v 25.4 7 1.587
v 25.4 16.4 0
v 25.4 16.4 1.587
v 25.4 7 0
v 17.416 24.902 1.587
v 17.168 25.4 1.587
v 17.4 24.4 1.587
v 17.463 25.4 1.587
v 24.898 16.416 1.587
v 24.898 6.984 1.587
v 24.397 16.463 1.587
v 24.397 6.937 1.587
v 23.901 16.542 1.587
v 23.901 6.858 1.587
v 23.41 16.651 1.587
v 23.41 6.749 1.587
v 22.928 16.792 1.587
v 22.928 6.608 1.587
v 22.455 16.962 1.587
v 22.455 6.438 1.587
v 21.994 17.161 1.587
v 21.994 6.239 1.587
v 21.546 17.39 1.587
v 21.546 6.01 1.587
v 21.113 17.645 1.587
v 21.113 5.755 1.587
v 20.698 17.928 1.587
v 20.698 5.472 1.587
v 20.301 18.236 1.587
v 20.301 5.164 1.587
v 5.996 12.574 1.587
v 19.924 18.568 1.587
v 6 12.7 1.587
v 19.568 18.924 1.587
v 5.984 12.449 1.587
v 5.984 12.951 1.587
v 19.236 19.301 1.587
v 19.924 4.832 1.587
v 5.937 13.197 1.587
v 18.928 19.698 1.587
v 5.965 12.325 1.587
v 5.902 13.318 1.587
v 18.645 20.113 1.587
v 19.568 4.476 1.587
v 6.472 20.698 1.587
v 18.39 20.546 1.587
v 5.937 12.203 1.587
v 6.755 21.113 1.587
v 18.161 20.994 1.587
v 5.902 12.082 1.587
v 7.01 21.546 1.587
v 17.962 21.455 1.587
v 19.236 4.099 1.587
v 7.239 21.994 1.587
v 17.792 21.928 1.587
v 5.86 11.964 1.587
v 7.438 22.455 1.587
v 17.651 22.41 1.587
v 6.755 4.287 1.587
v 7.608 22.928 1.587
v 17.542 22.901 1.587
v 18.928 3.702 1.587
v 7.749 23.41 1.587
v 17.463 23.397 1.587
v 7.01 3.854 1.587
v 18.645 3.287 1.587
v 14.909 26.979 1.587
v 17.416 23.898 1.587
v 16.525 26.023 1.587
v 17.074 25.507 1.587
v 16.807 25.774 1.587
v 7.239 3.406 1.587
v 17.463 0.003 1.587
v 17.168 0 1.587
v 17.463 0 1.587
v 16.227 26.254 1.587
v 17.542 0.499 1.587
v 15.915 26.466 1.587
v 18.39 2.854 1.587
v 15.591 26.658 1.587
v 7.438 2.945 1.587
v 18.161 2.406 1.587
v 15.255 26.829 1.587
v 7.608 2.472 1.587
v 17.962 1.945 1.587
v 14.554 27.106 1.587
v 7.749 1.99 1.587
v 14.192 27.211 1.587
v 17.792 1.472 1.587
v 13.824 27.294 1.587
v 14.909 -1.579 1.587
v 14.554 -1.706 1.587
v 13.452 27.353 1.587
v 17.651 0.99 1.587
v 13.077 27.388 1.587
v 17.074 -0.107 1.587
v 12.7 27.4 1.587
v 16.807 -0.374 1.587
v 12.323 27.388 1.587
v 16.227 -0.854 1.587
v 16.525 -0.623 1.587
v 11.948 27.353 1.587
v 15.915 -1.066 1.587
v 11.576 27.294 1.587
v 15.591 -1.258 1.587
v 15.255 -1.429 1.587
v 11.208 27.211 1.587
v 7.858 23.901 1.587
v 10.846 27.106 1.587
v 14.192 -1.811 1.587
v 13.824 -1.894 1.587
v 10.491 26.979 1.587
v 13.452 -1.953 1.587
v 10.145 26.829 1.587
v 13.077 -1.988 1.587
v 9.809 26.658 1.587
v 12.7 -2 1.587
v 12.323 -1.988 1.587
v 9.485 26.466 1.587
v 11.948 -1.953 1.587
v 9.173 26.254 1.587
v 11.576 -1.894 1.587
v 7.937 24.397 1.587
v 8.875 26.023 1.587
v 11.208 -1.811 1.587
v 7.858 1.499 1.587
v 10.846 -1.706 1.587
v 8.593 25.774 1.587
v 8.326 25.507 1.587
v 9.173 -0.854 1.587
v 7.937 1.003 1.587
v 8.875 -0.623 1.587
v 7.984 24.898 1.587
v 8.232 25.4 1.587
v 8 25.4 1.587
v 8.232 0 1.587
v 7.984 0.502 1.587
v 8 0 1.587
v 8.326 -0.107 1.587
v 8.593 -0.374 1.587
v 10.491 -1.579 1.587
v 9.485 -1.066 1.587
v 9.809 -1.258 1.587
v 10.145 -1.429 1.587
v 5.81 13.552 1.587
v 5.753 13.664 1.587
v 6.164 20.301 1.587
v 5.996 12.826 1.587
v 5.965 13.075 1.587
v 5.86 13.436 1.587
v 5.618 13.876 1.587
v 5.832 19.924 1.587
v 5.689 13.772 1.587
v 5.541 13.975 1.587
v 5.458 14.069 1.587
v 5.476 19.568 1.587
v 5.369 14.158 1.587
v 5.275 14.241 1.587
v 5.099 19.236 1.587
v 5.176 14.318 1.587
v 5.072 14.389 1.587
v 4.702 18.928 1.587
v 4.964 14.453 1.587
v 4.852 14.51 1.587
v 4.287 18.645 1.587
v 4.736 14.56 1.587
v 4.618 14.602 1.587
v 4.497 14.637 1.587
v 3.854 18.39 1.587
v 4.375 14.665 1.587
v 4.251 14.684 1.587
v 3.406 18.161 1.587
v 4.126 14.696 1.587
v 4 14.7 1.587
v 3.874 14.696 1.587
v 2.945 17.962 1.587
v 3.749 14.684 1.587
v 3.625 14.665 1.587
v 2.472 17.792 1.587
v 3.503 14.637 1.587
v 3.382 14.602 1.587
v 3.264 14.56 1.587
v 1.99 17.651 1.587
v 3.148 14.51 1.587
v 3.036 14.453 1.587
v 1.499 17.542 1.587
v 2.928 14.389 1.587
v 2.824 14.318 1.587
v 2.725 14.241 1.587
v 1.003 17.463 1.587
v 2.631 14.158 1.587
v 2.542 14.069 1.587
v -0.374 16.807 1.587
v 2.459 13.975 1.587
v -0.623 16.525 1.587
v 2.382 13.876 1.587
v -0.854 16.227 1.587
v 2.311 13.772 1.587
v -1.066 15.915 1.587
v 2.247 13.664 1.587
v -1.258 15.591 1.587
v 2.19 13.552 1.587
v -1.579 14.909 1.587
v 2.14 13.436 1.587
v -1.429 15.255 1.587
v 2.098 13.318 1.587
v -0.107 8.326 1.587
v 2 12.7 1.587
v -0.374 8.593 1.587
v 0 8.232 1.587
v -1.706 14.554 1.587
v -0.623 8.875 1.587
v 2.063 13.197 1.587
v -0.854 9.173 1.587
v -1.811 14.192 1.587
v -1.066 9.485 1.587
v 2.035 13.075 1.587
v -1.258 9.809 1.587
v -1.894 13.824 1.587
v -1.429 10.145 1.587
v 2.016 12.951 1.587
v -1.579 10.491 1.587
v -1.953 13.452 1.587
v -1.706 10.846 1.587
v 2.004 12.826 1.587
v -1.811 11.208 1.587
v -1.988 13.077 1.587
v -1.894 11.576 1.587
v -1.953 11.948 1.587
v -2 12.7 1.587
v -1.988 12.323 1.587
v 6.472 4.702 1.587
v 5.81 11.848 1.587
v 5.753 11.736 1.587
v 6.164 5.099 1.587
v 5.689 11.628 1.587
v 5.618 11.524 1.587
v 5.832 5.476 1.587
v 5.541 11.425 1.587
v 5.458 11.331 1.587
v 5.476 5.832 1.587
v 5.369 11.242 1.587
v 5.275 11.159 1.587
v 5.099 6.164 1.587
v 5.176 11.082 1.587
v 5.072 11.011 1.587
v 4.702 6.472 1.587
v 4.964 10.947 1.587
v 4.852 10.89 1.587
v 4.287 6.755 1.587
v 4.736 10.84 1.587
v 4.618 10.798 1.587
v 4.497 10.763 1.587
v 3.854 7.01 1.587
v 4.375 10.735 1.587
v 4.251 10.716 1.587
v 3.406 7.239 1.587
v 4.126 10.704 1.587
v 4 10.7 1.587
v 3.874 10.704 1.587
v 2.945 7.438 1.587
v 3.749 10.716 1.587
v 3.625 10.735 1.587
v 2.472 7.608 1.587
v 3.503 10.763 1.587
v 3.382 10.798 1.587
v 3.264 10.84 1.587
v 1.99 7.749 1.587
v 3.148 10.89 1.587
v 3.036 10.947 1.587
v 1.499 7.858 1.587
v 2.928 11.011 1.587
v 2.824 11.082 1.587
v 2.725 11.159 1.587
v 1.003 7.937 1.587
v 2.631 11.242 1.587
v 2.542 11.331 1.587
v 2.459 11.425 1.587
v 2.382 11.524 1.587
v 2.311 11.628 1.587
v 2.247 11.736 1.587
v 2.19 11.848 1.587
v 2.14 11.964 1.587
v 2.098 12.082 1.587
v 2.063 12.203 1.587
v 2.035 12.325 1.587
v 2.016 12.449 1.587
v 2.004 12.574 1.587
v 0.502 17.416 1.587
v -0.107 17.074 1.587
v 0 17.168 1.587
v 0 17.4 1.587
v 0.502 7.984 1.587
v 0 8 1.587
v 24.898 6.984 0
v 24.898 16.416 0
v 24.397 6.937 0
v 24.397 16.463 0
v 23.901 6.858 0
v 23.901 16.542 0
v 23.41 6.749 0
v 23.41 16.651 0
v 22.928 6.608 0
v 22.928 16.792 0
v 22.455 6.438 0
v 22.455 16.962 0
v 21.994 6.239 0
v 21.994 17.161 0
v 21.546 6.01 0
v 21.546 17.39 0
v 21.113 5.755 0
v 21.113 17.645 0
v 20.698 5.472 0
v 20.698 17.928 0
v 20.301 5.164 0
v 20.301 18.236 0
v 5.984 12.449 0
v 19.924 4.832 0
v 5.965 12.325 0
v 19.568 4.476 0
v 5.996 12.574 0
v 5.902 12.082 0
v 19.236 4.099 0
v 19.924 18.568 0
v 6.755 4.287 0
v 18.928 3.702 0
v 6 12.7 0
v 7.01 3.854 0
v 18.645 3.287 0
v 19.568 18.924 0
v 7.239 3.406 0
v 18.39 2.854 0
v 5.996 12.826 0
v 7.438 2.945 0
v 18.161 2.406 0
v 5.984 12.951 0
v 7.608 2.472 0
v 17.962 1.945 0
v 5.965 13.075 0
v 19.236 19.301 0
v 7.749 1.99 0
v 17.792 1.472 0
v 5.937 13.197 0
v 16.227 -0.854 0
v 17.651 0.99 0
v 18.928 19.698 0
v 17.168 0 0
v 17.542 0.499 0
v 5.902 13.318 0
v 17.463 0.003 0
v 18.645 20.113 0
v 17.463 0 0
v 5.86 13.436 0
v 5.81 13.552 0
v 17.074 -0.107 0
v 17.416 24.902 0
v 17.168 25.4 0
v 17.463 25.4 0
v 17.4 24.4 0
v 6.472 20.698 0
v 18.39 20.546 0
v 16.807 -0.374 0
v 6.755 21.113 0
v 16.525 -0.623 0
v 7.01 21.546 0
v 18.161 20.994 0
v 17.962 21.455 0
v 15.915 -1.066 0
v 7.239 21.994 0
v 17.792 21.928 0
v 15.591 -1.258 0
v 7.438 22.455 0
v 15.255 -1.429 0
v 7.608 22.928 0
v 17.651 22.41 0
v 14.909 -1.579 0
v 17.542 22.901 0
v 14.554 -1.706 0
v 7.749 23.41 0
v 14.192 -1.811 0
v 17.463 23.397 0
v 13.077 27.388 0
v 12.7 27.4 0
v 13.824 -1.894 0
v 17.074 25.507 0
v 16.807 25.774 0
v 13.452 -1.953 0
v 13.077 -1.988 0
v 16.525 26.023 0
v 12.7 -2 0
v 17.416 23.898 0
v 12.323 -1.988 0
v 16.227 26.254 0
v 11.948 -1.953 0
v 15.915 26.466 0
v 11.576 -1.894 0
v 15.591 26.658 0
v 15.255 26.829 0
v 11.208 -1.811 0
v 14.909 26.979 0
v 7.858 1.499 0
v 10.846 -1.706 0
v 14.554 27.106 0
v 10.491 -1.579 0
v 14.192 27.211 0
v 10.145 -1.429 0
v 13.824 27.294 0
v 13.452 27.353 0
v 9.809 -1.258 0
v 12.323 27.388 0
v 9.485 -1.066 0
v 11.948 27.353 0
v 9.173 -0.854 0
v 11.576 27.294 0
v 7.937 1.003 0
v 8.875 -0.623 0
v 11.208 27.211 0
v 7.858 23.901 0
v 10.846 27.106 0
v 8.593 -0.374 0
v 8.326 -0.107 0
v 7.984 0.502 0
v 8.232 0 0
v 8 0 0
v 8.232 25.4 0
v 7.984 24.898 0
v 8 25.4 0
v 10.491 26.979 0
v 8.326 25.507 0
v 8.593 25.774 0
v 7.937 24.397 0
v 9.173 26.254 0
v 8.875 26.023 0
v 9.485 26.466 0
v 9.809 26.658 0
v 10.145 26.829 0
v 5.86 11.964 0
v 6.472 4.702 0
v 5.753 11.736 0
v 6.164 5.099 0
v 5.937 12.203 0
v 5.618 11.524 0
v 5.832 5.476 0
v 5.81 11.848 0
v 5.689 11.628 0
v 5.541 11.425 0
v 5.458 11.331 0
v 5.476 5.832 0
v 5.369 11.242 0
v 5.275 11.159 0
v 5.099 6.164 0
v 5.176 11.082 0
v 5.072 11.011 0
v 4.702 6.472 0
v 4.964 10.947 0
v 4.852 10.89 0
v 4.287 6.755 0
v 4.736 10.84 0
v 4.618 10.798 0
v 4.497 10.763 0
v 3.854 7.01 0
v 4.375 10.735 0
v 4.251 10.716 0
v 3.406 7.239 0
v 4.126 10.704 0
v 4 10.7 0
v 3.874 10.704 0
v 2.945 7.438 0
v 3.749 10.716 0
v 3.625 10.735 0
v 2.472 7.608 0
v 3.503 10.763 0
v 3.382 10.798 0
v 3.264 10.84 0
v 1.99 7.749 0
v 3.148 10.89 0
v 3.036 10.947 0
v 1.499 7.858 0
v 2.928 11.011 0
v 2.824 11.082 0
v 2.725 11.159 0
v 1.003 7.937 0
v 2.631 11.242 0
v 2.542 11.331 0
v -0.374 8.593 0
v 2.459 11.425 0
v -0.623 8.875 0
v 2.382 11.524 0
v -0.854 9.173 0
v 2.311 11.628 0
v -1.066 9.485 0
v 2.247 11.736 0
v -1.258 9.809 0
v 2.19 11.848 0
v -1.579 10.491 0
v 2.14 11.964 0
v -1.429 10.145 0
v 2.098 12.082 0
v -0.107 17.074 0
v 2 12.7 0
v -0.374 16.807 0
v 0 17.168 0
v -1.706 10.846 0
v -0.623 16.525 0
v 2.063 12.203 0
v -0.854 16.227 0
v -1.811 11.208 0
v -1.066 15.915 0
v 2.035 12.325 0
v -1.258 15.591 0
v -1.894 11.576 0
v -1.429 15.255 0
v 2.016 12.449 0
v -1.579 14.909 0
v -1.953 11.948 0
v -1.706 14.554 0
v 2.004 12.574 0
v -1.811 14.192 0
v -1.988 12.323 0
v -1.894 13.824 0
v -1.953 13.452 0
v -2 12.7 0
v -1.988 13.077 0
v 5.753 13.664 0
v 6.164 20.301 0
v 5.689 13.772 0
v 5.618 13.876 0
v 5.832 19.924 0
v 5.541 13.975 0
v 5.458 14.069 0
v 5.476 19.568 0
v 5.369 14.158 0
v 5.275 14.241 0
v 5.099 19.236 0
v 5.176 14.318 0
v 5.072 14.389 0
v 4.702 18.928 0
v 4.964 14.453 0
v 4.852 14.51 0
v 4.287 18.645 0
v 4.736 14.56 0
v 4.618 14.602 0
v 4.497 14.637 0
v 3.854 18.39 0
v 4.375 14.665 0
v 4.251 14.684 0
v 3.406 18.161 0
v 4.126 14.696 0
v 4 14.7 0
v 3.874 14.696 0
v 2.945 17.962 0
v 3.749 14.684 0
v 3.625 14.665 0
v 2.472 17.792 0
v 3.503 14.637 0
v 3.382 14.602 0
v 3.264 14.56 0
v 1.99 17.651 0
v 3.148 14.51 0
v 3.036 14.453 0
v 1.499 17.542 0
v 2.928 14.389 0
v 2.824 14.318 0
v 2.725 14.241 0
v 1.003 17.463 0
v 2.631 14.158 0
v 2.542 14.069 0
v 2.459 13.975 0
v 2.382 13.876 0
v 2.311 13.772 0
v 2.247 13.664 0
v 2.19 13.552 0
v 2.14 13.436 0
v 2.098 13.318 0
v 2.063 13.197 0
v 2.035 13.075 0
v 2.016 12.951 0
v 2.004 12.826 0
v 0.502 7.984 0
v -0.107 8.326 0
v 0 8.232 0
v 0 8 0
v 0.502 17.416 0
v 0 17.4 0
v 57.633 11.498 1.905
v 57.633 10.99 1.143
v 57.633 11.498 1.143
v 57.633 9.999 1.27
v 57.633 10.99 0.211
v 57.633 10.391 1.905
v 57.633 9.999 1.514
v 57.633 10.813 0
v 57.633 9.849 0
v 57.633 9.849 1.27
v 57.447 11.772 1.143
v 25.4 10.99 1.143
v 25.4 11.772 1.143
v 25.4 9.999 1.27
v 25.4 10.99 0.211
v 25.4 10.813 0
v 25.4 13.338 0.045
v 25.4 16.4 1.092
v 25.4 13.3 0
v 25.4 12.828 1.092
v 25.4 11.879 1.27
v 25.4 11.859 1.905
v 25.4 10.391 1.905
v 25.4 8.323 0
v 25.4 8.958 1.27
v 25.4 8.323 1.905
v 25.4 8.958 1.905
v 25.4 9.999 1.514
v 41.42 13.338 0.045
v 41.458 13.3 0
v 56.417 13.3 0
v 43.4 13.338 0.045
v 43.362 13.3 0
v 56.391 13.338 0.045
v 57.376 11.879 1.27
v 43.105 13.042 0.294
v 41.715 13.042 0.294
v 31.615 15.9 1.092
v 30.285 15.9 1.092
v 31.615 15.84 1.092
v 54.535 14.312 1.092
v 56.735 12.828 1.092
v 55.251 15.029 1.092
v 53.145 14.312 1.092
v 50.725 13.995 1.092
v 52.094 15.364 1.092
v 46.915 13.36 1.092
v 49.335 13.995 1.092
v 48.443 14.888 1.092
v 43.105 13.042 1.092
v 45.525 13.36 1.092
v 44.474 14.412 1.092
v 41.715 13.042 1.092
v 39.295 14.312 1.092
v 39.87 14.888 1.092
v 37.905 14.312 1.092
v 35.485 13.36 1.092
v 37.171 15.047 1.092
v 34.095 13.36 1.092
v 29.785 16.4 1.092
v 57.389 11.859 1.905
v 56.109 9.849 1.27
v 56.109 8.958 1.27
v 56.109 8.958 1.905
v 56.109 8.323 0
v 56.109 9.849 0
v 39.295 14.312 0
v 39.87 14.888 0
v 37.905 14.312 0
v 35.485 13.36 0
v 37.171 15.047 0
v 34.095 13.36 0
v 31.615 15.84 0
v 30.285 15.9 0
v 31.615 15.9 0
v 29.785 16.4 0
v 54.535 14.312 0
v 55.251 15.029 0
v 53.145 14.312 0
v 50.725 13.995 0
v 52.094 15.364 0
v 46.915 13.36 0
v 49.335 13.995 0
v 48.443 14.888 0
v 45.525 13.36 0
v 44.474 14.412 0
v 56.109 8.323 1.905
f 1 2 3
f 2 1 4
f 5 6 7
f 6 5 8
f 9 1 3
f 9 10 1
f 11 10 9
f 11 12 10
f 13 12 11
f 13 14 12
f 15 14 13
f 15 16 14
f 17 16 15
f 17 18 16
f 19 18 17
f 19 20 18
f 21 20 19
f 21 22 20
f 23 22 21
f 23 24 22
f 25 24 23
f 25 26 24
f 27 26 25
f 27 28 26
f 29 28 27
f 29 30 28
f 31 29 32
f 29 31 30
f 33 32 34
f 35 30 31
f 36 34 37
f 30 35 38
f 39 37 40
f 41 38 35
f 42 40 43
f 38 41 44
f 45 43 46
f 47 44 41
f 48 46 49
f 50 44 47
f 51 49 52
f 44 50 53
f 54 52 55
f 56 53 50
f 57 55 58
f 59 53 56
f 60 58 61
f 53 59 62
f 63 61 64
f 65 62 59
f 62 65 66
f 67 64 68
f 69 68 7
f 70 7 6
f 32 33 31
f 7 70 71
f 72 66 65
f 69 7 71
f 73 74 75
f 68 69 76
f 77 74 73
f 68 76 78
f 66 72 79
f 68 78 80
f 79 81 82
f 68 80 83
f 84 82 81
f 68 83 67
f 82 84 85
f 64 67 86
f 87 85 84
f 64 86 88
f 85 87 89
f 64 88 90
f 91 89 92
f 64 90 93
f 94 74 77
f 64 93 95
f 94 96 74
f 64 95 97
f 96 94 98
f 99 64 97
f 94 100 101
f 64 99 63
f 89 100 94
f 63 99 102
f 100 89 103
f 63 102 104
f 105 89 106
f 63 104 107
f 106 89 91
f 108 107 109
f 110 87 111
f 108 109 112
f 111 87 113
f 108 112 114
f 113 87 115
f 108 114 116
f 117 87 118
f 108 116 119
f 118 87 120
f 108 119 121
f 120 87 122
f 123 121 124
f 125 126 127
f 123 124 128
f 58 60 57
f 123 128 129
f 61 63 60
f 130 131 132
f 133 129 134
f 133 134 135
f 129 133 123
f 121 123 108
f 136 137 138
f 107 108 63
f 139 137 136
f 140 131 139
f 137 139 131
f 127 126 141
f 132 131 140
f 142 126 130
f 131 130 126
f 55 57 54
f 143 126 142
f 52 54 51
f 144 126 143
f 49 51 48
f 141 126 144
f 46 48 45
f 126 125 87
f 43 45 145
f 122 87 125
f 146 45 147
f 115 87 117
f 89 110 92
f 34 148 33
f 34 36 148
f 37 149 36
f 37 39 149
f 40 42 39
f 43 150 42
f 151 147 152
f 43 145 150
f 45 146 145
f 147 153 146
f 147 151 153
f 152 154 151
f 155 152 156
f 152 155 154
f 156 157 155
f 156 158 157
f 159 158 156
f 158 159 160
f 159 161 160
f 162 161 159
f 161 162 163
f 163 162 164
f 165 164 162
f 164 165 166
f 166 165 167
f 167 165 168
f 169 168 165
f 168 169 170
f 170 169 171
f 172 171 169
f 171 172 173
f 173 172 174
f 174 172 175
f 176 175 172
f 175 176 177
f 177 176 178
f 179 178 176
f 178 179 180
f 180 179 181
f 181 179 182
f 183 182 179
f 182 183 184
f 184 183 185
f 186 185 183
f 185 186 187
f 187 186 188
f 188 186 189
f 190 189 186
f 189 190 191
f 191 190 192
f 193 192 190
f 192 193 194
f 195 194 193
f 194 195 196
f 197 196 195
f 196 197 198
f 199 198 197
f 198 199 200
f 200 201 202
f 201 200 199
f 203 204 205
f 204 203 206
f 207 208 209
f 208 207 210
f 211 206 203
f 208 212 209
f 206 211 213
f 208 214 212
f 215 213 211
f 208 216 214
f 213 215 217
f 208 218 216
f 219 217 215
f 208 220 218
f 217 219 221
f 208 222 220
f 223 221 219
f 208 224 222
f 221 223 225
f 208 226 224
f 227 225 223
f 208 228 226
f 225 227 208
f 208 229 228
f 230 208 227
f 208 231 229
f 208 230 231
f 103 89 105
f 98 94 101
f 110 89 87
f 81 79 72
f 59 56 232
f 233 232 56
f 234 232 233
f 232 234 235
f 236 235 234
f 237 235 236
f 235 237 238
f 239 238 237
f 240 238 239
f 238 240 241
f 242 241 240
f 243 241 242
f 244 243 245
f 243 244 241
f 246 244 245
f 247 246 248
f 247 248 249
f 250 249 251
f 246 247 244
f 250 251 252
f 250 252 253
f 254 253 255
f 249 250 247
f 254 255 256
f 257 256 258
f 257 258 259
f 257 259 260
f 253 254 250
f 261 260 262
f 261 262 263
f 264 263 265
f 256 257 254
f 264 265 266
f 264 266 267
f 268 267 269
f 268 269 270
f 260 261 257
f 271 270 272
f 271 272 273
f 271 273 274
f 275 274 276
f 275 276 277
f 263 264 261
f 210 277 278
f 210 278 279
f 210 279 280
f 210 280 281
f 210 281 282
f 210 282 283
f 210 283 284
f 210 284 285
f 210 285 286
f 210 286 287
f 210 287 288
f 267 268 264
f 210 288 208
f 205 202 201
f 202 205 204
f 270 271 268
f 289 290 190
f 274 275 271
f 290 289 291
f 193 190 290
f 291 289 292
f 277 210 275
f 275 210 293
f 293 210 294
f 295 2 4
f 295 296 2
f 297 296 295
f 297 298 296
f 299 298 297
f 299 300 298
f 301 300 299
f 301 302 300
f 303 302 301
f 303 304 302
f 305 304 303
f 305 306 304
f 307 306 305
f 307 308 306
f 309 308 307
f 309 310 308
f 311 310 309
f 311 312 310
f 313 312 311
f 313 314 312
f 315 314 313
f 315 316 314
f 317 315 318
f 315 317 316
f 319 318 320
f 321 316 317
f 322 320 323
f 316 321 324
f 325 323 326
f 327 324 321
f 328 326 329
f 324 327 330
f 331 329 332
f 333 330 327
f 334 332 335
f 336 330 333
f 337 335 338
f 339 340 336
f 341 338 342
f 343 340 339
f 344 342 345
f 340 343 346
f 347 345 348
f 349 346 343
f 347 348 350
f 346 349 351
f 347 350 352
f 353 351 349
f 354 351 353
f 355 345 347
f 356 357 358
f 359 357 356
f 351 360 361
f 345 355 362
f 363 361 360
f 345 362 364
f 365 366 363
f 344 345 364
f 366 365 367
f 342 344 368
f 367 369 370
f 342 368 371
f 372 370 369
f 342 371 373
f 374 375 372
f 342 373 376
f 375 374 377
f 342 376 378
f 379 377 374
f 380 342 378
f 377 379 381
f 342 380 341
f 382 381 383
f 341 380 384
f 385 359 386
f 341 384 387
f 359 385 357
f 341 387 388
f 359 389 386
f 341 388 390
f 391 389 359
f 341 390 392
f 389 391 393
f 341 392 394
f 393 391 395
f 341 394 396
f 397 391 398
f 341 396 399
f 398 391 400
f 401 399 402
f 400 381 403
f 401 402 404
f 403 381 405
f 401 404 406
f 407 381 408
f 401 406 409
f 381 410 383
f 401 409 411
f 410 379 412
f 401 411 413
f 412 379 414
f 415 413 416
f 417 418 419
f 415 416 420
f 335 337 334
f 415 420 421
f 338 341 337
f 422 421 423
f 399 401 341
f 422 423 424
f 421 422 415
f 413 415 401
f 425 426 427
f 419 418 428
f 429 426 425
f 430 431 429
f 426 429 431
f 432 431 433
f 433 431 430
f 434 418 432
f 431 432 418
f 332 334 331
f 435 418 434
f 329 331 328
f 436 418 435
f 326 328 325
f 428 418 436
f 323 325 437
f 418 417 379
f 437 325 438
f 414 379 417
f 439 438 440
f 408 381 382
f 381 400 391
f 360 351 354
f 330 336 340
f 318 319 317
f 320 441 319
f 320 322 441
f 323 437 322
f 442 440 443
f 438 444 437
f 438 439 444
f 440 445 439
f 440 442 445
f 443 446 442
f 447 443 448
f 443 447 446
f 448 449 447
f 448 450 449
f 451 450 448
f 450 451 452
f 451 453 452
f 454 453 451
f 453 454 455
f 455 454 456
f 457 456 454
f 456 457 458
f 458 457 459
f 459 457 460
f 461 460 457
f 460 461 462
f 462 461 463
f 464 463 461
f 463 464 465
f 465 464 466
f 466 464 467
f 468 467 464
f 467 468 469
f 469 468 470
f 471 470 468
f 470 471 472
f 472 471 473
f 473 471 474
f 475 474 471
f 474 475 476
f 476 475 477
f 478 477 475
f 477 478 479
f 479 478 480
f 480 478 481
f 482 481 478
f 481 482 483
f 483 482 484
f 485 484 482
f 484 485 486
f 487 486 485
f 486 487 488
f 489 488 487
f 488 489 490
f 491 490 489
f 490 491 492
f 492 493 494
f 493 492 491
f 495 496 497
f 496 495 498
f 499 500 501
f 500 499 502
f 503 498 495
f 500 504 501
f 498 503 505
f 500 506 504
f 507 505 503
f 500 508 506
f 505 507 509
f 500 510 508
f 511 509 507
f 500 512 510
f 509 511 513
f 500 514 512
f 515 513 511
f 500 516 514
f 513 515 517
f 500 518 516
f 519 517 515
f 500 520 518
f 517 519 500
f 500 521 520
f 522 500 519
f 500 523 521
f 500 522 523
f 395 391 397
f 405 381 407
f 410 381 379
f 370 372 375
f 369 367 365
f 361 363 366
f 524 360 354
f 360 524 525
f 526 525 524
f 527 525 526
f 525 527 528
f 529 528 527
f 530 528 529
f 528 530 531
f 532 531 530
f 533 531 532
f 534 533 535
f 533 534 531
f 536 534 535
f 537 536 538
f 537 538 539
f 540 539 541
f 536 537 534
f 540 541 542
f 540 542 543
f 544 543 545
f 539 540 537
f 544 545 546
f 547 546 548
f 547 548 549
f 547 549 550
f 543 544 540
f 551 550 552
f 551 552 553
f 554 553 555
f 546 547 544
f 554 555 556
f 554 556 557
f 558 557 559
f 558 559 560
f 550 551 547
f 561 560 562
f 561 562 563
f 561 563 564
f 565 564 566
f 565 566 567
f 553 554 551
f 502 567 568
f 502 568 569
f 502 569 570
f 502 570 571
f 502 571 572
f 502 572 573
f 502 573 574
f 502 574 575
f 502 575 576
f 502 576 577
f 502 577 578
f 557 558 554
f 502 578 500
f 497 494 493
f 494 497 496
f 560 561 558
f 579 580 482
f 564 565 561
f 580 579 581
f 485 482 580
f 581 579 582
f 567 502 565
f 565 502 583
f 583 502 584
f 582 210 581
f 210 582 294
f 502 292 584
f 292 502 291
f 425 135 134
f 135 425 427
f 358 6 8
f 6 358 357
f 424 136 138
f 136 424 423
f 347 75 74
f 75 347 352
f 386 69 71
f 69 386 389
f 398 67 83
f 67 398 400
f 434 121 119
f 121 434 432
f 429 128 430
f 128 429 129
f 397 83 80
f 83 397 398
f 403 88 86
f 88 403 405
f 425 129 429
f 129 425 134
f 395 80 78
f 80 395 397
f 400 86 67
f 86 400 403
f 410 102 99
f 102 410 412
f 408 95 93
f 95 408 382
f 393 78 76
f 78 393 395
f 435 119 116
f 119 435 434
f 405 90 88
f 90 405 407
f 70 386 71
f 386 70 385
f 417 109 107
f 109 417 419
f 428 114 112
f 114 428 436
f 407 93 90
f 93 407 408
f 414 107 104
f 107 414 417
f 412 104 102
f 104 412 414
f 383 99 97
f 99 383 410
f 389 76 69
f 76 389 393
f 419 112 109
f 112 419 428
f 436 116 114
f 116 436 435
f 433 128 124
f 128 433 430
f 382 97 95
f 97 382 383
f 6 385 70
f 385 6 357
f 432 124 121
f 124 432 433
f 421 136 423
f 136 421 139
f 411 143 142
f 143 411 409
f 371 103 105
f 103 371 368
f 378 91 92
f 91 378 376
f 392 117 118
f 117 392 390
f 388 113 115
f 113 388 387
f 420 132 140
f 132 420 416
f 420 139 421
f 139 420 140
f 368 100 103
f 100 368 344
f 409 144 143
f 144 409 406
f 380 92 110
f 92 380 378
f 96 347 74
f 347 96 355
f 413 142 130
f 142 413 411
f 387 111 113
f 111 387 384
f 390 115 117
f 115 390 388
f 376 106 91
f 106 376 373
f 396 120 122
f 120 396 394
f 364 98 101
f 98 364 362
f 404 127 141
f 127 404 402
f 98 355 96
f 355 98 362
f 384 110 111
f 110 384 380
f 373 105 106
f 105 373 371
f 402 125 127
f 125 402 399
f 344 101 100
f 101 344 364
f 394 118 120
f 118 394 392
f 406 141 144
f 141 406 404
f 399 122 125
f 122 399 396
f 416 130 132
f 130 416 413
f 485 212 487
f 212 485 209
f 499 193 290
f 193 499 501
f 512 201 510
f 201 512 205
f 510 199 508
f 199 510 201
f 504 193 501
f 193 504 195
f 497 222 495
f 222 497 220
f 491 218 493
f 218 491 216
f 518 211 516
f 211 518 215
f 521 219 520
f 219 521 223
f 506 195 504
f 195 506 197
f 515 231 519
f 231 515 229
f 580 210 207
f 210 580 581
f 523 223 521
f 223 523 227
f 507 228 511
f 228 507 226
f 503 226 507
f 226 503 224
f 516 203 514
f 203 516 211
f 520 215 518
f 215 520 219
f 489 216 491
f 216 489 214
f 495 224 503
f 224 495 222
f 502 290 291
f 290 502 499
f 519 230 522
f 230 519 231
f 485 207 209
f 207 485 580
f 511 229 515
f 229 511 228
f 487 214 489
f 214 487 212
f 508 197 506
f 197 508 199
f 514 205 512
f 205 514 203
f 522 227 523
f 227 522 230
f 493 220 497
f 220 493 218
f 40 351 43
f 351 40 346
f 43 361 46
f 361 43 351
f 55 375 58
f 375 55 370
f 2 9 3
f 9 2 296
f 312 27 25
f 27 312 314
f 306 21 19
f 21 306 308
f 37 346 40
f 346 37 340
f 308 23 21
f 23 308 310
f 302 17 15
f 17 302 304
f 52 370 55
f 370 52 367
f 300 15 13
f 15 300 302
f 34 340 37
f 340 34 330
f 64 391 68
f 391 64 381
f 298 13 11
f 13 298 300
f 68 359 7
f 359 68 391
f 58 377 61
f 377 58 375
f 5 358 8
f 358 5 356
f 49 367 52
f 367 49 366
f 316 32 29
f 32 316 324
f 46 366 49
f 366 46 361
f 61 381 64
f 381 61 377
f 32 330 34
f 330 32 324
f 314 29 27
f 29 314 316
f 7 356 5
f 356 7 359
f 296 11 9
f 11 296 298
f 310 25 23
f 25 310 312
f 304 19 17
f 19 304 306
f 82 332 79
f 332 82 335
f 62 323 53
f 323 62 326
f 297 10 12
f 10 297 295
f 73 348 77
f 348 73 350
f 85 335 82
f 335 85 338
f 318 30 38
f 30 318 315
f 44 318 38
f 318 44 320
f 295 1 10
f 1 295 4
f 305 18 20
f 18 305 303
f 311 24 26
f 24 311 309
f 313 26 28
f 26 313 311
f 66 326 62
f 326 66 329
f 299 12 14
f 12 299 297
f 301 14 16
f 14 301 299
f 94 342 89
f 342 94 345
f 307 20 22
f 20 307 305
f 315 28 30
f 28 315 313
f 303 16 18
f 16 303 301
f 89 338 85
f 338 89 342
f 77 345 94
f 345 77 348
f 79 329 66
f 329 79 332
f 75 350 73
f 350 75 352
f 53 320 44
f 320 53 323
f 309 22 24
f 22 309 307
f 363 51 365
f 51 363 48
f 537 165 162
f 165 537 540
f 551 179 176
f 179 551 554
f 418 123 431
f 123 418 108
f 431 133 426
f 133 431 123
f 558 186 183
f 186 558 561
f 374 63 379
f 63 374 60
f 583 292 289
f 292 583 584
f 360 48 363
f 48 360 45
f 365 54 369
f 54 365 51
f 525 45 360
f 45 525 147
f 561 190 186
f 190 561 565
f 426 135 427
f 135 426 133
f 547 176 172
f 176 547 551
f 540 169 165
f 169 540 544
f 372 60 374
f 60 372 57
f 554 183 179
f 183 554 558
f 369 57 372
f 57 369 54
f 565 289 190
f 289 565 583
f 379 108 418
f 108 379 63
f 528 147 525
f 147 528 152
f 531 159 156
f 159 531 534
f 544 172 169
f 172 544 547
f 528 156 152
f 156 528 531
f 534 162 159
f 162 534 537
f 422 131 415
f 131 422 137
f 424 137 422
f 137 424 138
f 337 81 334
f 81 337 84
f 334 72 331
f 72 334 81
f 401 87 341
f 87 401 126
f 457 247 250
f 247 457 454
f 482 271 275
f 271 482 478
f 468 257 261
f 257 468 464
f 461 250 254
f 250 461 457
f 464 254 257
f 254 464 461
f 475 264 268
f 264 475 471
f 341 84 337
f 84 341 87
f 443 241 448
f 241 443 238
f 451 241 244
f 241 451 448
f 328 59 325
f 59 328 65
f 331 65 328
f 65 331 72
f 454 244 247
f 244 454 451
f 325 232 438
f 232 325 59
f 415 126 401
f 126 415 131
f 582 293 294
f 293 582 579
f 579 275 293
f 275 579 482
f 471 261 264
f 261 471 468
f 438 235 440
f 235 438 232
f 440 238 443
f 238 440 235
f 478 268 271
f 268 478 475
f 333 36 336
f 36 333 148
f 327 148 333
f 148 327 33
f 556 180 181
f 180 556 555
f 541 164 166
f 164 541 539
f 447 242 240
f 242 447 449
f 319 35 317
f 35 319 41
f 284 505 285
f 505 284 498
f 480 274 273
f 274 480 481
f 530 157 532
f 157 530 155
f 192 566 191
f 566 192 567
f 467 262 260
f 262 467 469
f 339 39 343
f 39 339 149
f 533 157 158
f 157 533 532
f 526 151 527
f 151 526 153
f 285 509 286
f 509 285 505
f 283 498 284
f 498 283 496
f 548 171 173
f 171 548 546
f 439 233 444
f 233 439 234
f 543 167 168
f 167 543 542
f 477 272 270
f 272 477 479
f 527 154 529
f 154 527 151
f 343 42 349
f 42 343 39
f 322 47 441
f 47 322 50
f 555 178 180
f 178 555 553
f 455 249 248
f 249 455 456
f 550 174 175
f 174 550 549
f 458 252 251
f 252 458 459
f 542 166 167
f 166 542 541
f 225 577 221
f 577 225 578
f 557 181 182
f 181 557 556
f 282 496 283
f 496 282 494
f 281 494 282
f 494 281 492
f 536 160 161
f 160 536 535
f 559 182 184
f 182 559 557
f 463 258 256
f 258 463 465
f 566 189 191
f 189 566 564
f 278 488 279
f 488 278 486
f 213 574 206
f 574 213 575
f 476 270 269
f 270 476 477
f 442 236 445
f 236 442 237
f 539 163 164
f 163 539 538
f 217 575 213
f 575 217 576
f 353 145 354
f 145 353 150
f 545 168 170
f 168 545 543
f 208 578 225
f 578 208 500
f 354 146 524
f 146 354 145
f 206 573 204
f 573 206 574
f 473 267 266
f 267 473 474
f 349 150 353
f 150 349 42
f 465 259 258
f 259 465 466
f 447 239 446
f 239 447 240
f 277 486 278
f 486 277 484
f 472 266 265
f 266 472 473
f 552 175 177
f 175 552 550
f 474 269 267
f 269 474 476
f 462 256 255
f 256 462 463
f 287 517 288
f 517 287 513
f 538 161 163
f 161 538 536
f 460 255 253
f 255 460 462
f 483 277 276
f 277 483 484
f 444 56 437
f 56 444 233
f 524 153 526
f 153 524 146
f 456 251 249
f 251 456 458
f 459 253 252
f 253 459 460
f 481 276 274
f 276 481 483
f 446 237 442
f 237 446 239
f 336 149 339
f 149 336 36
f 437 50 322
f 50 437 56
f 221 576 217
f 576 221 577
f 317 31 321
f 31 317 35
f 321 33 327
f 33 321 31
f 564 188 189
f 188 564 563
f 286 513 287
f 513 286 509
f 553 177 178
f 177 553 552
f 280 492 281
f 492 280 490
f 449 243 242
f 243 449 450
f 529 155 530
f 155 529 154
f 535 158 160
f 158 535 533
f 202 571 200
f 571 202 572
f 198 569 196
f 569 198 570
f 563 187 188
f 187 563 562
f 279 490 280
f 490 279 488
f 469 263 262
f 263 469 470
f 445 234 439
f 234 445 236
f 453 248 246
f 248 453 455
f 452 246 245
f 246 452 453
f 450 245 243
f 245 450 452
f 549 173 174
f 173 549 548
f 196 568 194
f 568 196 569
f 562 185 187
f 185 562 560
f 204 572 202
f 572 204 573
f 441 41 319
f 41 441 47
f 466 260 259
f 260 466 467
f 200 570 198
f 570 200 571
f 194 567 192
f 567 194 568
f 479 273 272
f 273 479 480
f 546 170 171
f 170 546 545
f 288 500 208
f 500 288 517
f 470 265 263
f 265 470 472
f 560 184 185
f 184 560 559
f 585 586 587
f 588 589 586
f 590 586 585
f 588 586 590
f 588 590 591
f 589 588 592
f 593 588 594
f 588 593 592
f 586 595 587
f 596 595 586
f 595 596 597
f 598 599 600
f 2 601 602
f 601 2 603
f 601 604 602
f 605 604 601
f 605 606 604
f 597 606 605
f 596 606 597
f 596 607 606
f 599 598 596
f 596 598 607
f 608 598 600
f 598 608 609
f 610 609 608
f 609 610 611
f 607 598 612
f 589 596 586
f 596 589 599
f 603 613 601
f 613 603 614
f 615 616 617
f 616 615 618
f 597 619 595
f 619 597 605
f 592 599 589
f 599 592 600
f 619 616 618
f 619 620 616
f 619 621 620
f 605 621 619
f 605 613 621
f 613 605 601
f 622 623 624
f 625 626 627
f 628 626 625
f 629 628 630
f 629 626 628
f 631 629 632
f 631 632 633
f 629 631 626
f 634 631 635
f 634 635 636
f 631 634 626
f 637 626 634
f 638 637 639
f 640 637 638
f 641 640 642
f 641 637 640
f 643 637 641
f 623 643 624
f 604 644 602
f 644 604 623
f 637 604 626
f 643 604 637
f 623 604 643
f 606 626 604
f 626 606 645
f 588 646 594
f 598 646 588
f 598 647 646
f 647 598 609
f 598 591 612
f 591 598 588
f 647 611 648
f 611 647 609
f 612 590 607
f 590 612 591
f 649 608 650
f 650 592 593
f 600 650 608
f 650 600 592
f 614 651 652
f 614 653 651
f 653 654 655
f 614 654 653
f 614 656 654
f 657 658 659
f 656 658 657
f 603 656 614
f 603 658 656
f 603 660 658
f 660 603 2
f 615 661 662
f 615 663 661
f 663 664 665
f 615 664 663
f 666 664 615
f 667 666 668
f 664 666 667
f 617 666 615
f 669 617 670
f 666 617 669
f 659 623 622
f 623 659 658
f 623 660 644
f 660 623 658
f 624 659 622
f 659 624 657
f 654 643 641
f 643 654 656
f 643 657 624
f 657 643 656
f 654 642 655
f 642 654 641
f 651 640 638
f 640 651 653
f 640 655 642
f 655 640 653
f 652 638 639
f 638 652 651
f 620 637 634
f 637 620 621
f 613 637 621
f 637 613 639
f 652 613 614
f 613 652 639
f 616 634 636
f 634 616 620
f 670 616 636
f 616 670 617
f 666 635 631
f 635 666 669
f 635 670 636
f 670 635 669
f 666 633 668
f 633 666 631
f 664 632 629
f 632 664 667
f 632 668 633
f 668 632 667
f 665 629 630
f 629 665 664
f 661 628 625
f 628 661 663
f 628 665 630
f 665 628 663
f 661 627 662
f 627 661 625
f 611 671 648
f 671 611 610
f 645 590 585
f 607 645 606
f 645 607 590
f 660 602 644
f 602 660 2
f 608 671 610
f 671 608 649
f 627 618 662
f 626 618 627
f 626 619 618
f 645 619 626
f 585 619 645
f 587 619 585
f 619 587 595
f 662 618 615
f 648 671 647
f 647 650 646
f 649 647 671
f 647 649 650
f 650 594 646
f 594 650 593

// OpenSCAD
// github.com/ewust/keys
// but done by baburgess looks like

$fn=100;

function mm(i) = i*25.4;

module bow(bow_length, bow_width, bow_thickness)
{
	difference()
		{
				union()
						{
									cube([bow_length, bow_width, bow_thickness]);

											  	     //Place cylinders on the top and bottom of the bow for style

												     	     	       //Top middle
																	translate([bow_length / 2, bow_width - 4, 0]) cylinder(h = bow_thickness, r = 6);

																			      	//Bottom middle
																							translate([bow_length / 2, 4, 0]) cylinder(h = bow_thickness, r = 6);

																									      	//Left
																													translate([4, bow_width / 2, 0]) cylinder(h = bow_thickness, r = 6);
																														      		}

																																	//Place cylinders around the edges to create a more contoured design

																																		//Right top
																																				translate([bow_length, bow_width - 1, 0]) cylinder(h = bow_thickness, r = 8);

																																						       //Right bottom
																																								//Positioned -1 from the axis to create a bow stop
																																									     	translate([bow_length, -1 , 0]) cylinder(h = bow_thickness, r = 8);

																																												       //Left top
																																														translate([0, bow_width, 0]) cylinder(h = bow_thickness, r = 8);

																																															      //Left bottom
																																																	translate([0, 0, 0]) cylinder(h = bow_thickness, r = 8);

																																																		      //Place hole for keychain use
																																																		      	      	   translate([4, bow_width / 2, 0]) cylinder(h = bow_thickness, r = 2);
																																																				   		 }
																																																						 }

module bit()
{
	w = mm(1/4);
	  difference()
		{
				translate([-w/2, 0, 0]) cube([w, mm(1), w]);
						    translate([-mm(7/256), 0, 0]) rotate([0, 0, 135]) cube([w, w, w]);
						    			      translate([mm(7/256), 0, 0]) rotate([0, 0, -45]) cube([w, w, w]);
									      }
									      }

module blade(blade_length, blade_width, blade_thickness, key_cuts, shoulder, cut_spacing, cut_depth)
{
	difference()
		{
				cube([blade_length, blade_width, blade_thickness]);

						    //Contour tip
								translate([blade_length, mm(1/8), 0]) {
											 	      rotate([0, 0, 34]) cube([10, 10, blade_thickness]);
												      		    }

															//Tip stop
																translate([blade_length - mm(.06), 0, 0]) {
																			  	   cube([mm(.09877), mm(.0601), blade_thickness]);
																				   		     		}

																									//Cut the key channels
																									      	  union()
																												{
																															translate([0, mm(.105), 0]) cube([blade_length, mm(5/128), mm(.045)]);
																																      		    translate([0, mm(.14), mm(.05)]) rotate([230, 0, 0]) cube([blade_length, mm(8/64), blade_thickness]);
																																		    		  	   }

																																						translate([0, blade_width - mm(9/64), mm(.043)])
																																							      		  {
																																												cube([blade_length, mm(10/64), blade_thickness]);
																																																rotate([50, 0, 0]) cube([blade_length, blade_width, blade_thickness]);
																																																	       }

																																																		union() {
																																																					translate([0, mm(0.025), mm(.05)]) cube([blade_length, mm(.041), blade_thickness]);
																																																						      		 	   translate([0, mm(0.015) + mm(13/256), blade_thickness - mm(1/64)]) rotate([45, 0, 0]) cube([blade_length, mm(1/16), mm(1/16)]);
																																																									   		 	   }

																																																													//Cut the blade
																																																													      	  for (counter = [0:6])
																																																														      	       {
																																																																		translate([shoulder + (counter * cut_spacing) + .5, blade_width - (key_cuts[counter]) * cut_depth - .5, 0]) bit();
																																																																				      }
																																																																					}
																																																																					}

module best_g(key_cuts)
{
	blade_length = mm(1.269);
		     blade_width = mm(.318);
		     		 blade_thickness = mm(0.075);

				 shoulder = mm(0.2);
				 	  cut_spacing = mm(.15);
					  	      cut_depth = mm(.0125);

						      bow_length = mm(1);
						      		 bow_width = mm(1);
								 	   bow_thickness = mm(1/16);

									   union()
										{
												bow(bow_length, bow_width, bow_thickness);
															   translate([bow_length, bow_width - blade_width - 9, 0]) blade(blade_length, blade_width, blade_thickness, key_cuts, shoulder, cut_spacing, cut_depth);
															   			  }
																		  }

best_g([0, 8, 5, 9, 8, 6, 5]);
